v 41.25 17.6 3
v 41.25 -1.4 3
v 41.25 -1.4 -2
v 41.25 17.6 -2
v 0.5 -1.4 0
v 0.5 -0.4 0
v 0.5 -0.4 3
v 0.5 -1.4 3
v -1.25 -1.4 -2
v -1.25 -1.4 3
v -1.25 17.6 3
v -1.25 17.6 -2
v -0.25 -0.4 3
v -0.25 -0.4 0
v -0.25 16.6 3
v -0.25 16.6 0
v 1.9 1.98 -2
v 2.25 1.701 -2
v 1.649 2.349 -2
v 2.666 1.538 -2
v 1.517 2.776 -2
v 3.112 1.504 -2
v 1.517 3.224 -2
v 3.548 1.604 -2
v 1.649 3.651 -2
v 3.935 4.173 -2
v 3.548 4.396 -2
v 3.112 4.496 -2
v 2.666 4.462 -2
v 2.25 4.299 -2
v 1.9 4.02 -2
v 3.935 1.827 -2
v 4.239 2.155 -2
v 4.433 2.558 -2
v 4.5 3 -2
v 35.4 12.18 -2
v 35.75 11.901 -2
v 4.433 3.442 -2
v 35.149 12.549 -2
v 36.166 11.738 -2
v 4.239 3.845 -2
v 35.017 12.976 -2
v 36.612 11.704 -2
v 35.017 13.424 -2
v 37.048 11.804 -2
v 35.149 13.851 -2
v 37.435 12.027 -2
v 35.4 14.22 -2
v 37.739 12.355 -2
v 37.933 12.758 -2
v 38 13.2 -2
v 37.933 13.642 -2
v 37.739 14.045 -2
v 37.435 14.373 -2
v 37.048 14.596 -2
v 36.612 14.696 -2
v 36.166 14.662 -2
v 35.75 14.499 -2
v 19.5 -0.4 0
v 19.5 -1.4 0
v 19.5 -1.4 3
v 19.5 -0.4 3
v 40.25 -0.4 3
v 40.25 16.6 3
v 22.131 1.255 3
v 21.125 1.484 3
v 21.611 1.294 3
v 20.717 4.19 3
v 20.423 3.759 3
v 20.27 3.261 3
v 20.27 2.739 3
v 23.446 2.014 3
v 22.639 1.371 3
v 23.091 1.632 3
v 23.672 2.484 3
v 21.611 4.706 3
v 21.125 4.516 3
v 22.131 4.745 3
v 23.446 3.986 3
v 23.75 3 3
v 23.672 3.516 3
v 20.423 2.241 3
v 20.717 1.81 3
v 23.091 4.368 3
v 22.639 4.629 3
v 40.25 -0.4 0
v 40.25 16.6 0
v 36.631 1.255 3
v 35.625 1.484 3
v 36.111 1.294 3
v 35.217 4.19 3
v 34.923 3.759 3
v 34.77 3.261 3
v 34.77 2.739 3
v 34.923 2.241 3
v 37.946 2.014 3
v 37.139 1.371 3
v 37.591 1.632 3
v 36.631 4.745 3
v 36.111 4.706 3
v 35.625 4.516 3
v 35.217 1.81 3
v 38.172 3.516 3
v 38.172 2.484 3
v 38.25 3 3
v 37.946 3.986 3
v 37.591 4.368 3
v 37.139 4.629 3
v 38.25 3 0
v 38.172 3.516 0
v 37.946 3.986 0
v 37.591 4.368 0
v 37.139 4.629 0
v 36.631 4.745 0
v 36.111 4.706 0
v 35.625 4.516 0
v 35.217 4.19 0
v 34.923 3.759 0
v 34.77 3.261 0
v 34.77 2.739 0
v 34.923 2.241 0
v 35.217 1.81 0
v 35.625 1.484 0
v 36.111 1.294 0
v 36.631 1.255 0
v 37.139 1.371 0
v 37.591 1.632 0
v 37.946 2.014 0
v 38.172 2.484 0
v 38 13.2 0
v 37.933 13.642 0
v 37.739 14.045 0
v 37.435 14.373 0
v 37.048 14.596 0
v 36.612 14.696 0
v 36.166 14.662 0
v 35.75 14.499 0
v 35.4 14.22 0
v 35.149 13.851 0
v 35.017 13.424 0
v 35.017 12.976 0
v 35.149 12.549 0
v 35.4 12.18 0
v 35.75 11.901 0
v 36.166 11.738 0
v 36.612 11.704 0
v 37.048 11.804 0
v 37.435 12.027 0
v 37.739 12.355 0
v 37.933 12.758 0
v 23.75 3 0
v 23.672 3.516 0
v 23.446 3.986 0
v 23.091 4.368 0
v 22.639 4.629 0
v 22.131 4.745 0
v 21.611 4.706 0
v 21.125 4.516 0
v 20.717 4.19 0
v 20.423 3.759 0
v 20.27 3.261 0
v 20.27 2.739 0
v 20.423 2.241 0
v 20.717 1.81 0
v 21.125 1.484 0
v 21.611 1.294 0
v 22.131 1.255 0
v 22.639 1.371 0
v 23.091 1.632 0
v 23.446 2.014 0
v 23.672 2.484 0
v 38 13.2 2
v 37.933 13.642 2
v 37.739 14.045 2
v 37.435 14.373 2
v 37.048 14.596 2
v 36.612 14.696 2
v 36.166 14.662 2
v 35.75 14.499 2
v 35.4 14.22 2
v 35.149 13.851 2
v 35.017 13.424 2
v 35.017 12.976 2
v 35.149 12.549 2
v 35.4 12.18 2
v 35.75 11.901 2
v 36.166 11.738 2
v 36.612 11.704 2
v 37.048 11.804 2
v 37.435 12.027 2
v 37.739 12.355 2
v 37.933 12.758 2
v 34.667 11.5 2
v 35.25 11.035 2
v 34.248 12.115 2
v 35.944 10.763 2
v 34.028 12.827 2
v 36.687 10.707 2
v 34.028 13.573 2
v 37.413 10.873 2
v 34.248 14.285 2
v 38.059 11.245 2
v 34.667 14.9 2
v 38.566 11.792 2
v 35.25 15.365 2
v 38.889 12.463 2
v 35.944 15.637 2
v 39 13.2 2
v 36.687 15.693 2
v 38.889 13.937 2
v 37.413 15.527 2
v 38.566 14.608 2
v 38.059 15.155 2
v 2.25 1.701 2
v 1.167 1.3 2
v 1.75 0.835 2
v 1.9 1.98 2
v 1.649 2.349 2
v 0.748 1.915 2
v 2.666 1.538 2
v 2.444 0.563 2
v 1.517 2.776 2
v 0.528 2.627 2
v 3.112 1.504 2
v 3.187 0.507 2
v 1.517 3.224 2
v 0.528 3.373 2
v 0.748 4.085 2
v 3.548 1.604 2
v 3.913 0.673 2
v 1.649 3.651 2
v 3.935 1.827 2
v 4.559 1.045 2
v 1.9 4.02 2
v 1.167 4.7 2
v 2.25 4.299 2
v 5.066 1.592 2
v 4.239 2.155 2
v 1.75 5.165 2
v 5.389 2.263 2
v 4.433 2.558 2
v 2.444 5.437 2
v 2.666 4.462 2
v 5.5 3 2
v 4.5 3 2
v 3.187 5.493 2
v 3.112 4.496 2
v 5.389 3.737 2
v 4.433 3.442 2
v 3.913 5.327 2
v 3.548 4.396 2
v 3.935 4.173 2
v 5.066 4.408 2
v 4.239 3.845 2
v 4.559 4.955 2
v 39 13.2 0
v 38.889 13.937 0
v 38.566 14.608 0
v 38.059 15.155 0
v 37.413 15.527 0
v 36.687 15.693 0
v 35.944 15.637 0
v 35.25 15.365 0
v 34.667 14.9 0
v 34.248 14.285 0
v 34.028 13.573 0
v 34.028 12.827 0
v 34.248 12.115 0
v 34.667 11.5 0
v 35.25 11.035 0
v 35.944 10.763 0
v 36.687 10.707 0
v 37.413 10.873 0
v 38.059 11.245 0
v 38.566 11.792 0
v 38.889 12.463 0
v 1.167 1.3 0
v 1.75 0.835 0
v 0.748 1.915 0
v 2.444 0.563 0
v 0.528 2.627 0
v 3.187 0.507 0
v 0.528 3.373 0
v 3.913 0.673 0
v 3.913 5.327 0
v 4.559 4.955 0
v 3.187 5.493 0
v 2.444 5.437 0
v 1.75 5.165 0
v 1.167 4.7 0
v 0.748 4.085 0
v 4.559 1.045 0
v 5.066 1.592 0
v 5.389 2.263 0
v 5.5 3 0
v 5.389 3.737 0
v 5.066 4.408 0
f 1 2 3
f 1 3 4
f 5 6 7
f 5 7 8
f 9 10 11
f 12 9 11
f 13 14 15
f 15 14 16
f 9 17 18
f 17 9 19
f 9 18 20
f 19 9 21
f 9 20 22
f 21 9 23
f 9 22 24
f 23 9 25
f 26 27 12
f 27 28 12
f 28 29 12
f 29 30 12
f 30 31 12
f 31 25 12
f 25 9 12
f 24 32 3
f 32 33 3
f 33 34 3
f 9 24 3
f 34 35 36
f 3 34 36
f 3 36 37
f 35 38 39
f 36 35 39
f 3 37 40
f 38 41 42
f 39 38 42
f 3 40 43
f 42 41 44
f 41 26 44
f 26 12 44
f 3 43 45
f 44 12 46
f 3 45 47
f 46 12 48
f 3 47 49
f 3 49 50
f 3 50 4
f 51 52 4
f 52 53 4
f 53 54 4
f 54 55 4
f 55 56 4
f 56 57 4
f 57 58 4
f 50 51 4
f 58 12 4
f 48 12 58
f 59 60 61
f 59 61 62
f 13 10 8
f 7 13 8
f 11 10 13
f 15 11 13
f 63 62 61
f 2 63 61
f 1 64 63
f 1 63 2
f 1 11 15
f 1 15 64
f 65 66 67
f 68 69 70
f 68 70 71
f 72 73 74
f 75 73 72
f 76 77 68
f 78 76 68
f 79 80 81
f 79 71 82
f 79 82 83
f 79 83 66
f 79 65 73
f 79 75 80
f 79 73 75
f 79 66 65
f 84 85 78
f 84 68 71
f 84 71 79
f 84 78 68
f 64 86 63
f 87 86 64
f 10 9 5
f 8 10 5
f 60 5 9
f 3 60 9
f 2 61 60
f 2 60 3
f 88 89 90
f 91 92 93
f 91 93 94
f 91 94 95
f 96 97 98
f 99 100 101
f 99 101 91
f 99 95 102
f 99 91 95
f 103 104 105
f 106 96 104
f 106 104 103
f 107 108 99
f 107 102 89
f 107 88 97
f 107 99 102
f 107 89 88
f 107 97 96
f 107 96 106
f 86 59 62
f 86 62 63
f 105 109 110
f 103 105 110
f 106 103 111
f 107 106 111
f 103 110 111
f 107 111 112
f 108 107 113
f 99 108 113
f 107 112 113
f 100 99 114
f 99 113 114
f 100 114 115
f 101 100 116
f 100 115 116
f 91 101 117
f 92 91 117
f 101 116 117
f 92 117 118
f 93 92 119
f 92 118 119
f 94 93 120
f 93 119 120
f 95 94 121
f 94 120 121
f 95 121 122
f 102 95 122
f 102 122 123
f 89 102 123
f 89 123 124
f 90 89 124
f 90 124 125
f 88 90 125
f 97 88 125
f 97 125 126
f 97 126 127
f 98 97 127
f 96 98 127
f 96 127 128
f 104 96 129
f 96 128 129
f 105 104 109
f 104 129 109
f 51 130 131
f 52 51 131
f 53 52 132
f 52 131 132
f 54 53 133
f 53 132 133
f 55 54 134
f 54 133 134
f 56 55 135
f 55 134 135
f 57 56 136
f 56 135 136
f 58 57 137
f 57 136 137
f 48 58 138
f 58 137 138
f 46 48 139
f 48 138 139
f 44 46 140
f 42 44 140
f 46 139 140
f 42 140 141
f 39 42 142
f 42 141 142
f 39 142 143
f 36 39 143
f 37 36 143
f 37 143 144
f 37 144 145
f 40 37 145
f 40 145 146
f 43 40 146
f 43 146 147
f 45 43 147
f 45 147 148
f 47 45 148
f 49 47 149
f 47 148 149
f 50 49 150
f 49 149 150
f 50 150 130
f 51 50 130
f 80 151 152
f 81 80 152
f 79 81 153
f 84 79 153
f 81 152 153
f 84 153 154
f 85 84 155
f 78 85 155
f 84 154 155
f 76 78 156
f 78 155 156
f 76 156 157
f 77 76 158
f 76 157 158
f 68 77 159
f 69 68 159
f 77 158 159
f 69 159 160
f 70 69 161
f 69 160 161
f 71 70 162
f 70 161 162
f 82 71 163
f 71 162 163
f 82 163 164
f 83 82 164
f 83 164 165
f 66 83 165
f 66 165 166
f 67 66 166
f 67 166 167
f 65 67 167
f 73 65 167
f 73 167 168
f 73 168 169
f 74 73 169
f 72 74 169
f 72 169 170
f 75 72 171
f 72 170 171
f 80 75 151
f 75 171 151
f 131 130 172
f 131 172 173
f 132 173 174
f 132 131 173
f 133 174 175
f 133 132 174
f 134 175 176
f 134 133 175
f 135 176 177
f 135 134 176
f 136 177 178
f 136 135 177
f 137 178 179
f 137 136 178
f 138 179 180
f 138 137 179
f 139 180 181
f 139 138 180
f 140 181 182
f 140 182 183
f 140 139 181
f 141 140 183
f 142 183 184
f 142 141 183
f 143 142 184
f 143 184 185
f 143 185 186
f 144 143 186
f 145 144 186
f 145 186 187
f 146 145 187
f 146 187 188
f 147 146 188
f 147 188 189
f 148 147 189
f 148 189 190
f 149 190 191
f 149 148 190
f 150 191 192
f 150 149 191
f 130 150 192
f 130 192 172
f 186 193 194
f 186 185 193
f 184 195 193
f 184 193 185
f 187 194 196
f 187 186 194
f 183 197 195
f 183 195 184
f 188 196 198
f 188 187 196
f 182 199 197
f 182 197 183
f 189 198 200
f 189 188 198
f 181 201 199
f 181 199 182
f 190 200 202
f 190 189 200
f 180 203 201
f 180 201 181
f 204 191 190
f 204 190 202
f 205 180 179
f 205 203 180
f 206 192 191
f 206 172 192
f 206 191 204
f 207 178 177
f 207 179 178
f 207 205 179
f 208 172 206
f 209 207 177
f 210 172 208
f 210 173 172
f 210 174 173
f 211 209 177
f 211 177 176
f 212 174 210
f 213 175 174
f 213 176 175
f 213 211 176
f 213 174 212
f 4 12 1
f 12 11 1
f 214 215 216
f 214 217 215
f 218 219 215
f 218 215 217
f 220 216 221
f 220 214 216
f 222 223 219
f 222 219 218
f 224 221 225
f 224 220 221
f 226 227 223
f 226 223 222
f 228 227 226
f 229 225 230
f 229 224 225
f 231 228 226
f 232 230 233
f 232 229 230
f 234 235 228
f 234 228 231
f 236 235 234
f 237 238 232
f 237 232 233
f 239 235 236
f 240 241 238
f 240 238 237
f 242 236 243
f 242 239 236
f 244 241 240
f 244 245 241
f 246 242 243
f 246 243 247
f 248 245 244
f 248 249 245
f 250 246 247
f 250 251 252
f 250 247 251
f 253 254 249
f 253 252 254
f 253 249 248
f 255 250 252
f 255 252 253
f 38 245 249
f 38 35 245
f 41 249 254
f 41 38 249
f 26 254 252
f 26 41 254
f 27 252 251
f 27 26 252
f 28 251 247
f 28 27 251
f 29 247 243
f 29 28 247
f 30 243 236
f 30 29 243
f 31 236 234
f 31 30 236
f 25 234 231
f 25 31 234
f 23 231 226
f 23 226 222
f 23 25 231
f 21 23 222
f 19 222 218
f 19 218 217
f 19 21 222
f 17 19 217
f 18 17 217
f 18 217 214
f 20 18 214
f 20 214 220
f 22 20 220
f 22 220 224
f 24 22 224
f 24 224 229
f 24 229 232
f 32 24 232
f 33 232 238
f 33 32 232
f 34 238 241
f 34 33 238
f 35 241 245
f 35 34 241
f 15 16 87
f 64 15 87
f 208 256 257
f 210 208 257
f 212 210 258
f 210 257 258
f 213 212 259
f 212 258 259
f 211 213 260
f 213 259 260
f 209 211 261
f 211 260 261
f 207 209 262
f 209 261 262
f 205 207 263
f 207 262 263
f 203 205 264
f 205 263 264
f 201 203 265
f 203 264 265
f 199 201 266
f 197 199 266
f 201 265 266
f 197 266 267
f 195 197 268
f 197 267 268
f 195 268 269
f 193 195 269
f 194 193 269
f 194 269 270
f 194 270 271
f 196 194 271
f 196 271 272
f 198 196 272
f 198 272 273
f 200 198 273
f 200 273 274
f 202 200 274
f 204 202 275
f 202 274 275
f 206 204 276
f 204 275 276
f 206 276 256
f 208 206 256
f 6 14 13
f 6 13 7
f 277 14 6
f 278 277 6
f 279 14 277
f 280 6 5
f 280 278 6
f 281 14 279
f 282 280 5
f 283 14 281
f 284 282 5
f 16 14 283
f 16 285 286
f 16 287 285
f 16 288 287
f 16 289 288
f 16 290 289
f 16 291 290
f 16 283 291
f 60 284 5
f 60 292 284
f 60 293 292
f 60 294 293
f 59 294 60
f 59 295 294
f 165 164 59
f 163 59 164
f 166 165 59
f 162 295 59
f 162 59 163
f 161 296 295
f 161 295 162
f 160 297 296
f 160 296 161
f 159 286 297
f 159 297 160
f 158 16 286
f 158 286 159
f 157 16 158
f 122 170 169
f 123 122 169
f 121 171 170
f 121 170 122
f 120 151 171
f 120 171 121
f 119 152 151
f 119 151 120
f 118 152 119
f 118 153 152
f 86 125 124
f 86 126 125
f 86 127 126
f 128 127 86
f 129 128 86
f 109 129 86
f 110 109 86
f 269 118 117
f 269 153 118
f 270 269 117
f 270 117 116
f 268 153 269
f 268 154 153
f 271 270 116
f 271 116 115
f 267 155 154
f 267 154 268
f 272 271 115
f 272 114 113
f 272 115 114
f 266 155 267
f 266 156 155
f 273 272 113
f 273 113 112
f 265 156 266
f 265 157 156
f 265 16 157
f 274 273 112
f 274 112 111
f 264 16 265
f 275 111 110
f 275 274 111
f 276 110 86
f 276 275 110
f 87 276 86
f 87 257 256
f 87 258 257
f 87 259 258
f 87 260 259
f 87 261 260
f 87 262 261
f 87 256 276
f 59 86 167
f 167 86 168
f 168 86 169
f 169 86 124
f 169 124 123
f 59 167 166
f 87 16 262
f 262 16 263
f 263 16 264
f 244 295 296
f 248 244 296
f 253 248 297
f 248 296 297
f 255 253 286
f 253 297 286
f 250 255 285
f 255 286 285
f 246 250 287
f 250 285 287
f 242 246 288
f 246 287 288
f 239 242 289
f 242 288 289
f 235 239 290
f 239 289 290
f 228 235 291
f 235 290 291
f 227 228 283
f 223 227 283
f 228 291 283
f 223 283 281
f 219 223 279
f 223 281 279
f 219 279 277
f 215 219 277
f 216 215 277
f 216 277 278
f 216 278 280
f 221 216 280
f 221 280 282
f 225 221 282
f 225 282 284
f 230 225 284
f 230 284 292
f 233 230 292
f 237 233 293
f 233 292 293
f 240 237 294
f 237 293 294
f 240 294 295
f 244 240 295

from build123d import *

# Parameters (mm, degrees)
SKETCH001_W   = 42.5
SKETCH001_H   = 19
SKETCH001_W_2 = 40.5
SKETCH001_H_2 = 17
PAD_DEPTH     = 3
SKETCH002_W   = 42.5
SKETCH002_H   = 19
SKETCH002_R   = 1.5
PAD001_DEPTH  = 2
SKETCH003_R   = 1.75
PAD002_DEPTH  = 3
POCKET_DEPTH  = 3.001
SKETCH005_R   = 2.5
SKETCH005_R_2 = 1.5
PAD003_DEPTH  = 2


with BuildPart() as part:
    # Sketch001 → Pad (new body)
    with BuildSketch(Plane.XY):
        with Locations((20, 8.1)):
            Rectangle(SKETCH001_W, SKETCH001_H)
        with Locations((20, 8.1)):
            Rectangle(SKETCH001_W_2, SKETCH001_H_2, mode=Mode.SUBTRACT)
    extrude(amount=PAD_DEPTH)

    # Sketch002 → Pad001 (join)
    with BuildSketch(Plane.XY):
        with Locations((20, 8.1)):
            Rectangle(SKETCH002_W, SKETCH002_H)
        with Locations((3, 3)):
            Circle(SKETCH002_R, mode=Mode.SUBTRACT)
        with Locations((36.5, 13.2)):
            Circle(SKETCH002_R, mode=Mode.SUBTRACT)
    extrude(amount=-PAD001_DEPTH)

    # Sketch003 → Pad002 (join)
    with BuildSketch(Plane.XY):
        with Locations((22, 3)):
            Circle(SKETCH003_R)
        with Locations((36.5, 3)):
            Circle(SKETCH003_R)
    extrude(amount=PAD002_DEPTH)

    # Sketch004 → Pocket (cut, through all)
    with BuildSketch(Plane.XY):
        Polygon((19.5, 0), (5.5, 0), (0.5, 0), (0.5, -1.4), (5.5, -1.4), (19.5, -1.4), align=None)
    extrude(amount=POCKET_DEPTH, mode=Mode.SUBTRACT)

    # Sketch005 → Pad003 (join)
    with BuildSketch(Plane.XY):
        with Locations((3, 3)):
            Circle(SKETCH005_R)
        with Locations((3, 3)):
            Circle(SKETCH005_R_2, mode=Mode.SUBTRACT)
        with Locations((36.5, 13.2)):
            Circle(SKETCH005_R)
        with Locations((36.5, 13.2)):
            Circle(SKETCH005_R_2, mode=Mode.SUBTRACT)
    extrude(amount=PAD003_DEPTH)


solid = part.part
